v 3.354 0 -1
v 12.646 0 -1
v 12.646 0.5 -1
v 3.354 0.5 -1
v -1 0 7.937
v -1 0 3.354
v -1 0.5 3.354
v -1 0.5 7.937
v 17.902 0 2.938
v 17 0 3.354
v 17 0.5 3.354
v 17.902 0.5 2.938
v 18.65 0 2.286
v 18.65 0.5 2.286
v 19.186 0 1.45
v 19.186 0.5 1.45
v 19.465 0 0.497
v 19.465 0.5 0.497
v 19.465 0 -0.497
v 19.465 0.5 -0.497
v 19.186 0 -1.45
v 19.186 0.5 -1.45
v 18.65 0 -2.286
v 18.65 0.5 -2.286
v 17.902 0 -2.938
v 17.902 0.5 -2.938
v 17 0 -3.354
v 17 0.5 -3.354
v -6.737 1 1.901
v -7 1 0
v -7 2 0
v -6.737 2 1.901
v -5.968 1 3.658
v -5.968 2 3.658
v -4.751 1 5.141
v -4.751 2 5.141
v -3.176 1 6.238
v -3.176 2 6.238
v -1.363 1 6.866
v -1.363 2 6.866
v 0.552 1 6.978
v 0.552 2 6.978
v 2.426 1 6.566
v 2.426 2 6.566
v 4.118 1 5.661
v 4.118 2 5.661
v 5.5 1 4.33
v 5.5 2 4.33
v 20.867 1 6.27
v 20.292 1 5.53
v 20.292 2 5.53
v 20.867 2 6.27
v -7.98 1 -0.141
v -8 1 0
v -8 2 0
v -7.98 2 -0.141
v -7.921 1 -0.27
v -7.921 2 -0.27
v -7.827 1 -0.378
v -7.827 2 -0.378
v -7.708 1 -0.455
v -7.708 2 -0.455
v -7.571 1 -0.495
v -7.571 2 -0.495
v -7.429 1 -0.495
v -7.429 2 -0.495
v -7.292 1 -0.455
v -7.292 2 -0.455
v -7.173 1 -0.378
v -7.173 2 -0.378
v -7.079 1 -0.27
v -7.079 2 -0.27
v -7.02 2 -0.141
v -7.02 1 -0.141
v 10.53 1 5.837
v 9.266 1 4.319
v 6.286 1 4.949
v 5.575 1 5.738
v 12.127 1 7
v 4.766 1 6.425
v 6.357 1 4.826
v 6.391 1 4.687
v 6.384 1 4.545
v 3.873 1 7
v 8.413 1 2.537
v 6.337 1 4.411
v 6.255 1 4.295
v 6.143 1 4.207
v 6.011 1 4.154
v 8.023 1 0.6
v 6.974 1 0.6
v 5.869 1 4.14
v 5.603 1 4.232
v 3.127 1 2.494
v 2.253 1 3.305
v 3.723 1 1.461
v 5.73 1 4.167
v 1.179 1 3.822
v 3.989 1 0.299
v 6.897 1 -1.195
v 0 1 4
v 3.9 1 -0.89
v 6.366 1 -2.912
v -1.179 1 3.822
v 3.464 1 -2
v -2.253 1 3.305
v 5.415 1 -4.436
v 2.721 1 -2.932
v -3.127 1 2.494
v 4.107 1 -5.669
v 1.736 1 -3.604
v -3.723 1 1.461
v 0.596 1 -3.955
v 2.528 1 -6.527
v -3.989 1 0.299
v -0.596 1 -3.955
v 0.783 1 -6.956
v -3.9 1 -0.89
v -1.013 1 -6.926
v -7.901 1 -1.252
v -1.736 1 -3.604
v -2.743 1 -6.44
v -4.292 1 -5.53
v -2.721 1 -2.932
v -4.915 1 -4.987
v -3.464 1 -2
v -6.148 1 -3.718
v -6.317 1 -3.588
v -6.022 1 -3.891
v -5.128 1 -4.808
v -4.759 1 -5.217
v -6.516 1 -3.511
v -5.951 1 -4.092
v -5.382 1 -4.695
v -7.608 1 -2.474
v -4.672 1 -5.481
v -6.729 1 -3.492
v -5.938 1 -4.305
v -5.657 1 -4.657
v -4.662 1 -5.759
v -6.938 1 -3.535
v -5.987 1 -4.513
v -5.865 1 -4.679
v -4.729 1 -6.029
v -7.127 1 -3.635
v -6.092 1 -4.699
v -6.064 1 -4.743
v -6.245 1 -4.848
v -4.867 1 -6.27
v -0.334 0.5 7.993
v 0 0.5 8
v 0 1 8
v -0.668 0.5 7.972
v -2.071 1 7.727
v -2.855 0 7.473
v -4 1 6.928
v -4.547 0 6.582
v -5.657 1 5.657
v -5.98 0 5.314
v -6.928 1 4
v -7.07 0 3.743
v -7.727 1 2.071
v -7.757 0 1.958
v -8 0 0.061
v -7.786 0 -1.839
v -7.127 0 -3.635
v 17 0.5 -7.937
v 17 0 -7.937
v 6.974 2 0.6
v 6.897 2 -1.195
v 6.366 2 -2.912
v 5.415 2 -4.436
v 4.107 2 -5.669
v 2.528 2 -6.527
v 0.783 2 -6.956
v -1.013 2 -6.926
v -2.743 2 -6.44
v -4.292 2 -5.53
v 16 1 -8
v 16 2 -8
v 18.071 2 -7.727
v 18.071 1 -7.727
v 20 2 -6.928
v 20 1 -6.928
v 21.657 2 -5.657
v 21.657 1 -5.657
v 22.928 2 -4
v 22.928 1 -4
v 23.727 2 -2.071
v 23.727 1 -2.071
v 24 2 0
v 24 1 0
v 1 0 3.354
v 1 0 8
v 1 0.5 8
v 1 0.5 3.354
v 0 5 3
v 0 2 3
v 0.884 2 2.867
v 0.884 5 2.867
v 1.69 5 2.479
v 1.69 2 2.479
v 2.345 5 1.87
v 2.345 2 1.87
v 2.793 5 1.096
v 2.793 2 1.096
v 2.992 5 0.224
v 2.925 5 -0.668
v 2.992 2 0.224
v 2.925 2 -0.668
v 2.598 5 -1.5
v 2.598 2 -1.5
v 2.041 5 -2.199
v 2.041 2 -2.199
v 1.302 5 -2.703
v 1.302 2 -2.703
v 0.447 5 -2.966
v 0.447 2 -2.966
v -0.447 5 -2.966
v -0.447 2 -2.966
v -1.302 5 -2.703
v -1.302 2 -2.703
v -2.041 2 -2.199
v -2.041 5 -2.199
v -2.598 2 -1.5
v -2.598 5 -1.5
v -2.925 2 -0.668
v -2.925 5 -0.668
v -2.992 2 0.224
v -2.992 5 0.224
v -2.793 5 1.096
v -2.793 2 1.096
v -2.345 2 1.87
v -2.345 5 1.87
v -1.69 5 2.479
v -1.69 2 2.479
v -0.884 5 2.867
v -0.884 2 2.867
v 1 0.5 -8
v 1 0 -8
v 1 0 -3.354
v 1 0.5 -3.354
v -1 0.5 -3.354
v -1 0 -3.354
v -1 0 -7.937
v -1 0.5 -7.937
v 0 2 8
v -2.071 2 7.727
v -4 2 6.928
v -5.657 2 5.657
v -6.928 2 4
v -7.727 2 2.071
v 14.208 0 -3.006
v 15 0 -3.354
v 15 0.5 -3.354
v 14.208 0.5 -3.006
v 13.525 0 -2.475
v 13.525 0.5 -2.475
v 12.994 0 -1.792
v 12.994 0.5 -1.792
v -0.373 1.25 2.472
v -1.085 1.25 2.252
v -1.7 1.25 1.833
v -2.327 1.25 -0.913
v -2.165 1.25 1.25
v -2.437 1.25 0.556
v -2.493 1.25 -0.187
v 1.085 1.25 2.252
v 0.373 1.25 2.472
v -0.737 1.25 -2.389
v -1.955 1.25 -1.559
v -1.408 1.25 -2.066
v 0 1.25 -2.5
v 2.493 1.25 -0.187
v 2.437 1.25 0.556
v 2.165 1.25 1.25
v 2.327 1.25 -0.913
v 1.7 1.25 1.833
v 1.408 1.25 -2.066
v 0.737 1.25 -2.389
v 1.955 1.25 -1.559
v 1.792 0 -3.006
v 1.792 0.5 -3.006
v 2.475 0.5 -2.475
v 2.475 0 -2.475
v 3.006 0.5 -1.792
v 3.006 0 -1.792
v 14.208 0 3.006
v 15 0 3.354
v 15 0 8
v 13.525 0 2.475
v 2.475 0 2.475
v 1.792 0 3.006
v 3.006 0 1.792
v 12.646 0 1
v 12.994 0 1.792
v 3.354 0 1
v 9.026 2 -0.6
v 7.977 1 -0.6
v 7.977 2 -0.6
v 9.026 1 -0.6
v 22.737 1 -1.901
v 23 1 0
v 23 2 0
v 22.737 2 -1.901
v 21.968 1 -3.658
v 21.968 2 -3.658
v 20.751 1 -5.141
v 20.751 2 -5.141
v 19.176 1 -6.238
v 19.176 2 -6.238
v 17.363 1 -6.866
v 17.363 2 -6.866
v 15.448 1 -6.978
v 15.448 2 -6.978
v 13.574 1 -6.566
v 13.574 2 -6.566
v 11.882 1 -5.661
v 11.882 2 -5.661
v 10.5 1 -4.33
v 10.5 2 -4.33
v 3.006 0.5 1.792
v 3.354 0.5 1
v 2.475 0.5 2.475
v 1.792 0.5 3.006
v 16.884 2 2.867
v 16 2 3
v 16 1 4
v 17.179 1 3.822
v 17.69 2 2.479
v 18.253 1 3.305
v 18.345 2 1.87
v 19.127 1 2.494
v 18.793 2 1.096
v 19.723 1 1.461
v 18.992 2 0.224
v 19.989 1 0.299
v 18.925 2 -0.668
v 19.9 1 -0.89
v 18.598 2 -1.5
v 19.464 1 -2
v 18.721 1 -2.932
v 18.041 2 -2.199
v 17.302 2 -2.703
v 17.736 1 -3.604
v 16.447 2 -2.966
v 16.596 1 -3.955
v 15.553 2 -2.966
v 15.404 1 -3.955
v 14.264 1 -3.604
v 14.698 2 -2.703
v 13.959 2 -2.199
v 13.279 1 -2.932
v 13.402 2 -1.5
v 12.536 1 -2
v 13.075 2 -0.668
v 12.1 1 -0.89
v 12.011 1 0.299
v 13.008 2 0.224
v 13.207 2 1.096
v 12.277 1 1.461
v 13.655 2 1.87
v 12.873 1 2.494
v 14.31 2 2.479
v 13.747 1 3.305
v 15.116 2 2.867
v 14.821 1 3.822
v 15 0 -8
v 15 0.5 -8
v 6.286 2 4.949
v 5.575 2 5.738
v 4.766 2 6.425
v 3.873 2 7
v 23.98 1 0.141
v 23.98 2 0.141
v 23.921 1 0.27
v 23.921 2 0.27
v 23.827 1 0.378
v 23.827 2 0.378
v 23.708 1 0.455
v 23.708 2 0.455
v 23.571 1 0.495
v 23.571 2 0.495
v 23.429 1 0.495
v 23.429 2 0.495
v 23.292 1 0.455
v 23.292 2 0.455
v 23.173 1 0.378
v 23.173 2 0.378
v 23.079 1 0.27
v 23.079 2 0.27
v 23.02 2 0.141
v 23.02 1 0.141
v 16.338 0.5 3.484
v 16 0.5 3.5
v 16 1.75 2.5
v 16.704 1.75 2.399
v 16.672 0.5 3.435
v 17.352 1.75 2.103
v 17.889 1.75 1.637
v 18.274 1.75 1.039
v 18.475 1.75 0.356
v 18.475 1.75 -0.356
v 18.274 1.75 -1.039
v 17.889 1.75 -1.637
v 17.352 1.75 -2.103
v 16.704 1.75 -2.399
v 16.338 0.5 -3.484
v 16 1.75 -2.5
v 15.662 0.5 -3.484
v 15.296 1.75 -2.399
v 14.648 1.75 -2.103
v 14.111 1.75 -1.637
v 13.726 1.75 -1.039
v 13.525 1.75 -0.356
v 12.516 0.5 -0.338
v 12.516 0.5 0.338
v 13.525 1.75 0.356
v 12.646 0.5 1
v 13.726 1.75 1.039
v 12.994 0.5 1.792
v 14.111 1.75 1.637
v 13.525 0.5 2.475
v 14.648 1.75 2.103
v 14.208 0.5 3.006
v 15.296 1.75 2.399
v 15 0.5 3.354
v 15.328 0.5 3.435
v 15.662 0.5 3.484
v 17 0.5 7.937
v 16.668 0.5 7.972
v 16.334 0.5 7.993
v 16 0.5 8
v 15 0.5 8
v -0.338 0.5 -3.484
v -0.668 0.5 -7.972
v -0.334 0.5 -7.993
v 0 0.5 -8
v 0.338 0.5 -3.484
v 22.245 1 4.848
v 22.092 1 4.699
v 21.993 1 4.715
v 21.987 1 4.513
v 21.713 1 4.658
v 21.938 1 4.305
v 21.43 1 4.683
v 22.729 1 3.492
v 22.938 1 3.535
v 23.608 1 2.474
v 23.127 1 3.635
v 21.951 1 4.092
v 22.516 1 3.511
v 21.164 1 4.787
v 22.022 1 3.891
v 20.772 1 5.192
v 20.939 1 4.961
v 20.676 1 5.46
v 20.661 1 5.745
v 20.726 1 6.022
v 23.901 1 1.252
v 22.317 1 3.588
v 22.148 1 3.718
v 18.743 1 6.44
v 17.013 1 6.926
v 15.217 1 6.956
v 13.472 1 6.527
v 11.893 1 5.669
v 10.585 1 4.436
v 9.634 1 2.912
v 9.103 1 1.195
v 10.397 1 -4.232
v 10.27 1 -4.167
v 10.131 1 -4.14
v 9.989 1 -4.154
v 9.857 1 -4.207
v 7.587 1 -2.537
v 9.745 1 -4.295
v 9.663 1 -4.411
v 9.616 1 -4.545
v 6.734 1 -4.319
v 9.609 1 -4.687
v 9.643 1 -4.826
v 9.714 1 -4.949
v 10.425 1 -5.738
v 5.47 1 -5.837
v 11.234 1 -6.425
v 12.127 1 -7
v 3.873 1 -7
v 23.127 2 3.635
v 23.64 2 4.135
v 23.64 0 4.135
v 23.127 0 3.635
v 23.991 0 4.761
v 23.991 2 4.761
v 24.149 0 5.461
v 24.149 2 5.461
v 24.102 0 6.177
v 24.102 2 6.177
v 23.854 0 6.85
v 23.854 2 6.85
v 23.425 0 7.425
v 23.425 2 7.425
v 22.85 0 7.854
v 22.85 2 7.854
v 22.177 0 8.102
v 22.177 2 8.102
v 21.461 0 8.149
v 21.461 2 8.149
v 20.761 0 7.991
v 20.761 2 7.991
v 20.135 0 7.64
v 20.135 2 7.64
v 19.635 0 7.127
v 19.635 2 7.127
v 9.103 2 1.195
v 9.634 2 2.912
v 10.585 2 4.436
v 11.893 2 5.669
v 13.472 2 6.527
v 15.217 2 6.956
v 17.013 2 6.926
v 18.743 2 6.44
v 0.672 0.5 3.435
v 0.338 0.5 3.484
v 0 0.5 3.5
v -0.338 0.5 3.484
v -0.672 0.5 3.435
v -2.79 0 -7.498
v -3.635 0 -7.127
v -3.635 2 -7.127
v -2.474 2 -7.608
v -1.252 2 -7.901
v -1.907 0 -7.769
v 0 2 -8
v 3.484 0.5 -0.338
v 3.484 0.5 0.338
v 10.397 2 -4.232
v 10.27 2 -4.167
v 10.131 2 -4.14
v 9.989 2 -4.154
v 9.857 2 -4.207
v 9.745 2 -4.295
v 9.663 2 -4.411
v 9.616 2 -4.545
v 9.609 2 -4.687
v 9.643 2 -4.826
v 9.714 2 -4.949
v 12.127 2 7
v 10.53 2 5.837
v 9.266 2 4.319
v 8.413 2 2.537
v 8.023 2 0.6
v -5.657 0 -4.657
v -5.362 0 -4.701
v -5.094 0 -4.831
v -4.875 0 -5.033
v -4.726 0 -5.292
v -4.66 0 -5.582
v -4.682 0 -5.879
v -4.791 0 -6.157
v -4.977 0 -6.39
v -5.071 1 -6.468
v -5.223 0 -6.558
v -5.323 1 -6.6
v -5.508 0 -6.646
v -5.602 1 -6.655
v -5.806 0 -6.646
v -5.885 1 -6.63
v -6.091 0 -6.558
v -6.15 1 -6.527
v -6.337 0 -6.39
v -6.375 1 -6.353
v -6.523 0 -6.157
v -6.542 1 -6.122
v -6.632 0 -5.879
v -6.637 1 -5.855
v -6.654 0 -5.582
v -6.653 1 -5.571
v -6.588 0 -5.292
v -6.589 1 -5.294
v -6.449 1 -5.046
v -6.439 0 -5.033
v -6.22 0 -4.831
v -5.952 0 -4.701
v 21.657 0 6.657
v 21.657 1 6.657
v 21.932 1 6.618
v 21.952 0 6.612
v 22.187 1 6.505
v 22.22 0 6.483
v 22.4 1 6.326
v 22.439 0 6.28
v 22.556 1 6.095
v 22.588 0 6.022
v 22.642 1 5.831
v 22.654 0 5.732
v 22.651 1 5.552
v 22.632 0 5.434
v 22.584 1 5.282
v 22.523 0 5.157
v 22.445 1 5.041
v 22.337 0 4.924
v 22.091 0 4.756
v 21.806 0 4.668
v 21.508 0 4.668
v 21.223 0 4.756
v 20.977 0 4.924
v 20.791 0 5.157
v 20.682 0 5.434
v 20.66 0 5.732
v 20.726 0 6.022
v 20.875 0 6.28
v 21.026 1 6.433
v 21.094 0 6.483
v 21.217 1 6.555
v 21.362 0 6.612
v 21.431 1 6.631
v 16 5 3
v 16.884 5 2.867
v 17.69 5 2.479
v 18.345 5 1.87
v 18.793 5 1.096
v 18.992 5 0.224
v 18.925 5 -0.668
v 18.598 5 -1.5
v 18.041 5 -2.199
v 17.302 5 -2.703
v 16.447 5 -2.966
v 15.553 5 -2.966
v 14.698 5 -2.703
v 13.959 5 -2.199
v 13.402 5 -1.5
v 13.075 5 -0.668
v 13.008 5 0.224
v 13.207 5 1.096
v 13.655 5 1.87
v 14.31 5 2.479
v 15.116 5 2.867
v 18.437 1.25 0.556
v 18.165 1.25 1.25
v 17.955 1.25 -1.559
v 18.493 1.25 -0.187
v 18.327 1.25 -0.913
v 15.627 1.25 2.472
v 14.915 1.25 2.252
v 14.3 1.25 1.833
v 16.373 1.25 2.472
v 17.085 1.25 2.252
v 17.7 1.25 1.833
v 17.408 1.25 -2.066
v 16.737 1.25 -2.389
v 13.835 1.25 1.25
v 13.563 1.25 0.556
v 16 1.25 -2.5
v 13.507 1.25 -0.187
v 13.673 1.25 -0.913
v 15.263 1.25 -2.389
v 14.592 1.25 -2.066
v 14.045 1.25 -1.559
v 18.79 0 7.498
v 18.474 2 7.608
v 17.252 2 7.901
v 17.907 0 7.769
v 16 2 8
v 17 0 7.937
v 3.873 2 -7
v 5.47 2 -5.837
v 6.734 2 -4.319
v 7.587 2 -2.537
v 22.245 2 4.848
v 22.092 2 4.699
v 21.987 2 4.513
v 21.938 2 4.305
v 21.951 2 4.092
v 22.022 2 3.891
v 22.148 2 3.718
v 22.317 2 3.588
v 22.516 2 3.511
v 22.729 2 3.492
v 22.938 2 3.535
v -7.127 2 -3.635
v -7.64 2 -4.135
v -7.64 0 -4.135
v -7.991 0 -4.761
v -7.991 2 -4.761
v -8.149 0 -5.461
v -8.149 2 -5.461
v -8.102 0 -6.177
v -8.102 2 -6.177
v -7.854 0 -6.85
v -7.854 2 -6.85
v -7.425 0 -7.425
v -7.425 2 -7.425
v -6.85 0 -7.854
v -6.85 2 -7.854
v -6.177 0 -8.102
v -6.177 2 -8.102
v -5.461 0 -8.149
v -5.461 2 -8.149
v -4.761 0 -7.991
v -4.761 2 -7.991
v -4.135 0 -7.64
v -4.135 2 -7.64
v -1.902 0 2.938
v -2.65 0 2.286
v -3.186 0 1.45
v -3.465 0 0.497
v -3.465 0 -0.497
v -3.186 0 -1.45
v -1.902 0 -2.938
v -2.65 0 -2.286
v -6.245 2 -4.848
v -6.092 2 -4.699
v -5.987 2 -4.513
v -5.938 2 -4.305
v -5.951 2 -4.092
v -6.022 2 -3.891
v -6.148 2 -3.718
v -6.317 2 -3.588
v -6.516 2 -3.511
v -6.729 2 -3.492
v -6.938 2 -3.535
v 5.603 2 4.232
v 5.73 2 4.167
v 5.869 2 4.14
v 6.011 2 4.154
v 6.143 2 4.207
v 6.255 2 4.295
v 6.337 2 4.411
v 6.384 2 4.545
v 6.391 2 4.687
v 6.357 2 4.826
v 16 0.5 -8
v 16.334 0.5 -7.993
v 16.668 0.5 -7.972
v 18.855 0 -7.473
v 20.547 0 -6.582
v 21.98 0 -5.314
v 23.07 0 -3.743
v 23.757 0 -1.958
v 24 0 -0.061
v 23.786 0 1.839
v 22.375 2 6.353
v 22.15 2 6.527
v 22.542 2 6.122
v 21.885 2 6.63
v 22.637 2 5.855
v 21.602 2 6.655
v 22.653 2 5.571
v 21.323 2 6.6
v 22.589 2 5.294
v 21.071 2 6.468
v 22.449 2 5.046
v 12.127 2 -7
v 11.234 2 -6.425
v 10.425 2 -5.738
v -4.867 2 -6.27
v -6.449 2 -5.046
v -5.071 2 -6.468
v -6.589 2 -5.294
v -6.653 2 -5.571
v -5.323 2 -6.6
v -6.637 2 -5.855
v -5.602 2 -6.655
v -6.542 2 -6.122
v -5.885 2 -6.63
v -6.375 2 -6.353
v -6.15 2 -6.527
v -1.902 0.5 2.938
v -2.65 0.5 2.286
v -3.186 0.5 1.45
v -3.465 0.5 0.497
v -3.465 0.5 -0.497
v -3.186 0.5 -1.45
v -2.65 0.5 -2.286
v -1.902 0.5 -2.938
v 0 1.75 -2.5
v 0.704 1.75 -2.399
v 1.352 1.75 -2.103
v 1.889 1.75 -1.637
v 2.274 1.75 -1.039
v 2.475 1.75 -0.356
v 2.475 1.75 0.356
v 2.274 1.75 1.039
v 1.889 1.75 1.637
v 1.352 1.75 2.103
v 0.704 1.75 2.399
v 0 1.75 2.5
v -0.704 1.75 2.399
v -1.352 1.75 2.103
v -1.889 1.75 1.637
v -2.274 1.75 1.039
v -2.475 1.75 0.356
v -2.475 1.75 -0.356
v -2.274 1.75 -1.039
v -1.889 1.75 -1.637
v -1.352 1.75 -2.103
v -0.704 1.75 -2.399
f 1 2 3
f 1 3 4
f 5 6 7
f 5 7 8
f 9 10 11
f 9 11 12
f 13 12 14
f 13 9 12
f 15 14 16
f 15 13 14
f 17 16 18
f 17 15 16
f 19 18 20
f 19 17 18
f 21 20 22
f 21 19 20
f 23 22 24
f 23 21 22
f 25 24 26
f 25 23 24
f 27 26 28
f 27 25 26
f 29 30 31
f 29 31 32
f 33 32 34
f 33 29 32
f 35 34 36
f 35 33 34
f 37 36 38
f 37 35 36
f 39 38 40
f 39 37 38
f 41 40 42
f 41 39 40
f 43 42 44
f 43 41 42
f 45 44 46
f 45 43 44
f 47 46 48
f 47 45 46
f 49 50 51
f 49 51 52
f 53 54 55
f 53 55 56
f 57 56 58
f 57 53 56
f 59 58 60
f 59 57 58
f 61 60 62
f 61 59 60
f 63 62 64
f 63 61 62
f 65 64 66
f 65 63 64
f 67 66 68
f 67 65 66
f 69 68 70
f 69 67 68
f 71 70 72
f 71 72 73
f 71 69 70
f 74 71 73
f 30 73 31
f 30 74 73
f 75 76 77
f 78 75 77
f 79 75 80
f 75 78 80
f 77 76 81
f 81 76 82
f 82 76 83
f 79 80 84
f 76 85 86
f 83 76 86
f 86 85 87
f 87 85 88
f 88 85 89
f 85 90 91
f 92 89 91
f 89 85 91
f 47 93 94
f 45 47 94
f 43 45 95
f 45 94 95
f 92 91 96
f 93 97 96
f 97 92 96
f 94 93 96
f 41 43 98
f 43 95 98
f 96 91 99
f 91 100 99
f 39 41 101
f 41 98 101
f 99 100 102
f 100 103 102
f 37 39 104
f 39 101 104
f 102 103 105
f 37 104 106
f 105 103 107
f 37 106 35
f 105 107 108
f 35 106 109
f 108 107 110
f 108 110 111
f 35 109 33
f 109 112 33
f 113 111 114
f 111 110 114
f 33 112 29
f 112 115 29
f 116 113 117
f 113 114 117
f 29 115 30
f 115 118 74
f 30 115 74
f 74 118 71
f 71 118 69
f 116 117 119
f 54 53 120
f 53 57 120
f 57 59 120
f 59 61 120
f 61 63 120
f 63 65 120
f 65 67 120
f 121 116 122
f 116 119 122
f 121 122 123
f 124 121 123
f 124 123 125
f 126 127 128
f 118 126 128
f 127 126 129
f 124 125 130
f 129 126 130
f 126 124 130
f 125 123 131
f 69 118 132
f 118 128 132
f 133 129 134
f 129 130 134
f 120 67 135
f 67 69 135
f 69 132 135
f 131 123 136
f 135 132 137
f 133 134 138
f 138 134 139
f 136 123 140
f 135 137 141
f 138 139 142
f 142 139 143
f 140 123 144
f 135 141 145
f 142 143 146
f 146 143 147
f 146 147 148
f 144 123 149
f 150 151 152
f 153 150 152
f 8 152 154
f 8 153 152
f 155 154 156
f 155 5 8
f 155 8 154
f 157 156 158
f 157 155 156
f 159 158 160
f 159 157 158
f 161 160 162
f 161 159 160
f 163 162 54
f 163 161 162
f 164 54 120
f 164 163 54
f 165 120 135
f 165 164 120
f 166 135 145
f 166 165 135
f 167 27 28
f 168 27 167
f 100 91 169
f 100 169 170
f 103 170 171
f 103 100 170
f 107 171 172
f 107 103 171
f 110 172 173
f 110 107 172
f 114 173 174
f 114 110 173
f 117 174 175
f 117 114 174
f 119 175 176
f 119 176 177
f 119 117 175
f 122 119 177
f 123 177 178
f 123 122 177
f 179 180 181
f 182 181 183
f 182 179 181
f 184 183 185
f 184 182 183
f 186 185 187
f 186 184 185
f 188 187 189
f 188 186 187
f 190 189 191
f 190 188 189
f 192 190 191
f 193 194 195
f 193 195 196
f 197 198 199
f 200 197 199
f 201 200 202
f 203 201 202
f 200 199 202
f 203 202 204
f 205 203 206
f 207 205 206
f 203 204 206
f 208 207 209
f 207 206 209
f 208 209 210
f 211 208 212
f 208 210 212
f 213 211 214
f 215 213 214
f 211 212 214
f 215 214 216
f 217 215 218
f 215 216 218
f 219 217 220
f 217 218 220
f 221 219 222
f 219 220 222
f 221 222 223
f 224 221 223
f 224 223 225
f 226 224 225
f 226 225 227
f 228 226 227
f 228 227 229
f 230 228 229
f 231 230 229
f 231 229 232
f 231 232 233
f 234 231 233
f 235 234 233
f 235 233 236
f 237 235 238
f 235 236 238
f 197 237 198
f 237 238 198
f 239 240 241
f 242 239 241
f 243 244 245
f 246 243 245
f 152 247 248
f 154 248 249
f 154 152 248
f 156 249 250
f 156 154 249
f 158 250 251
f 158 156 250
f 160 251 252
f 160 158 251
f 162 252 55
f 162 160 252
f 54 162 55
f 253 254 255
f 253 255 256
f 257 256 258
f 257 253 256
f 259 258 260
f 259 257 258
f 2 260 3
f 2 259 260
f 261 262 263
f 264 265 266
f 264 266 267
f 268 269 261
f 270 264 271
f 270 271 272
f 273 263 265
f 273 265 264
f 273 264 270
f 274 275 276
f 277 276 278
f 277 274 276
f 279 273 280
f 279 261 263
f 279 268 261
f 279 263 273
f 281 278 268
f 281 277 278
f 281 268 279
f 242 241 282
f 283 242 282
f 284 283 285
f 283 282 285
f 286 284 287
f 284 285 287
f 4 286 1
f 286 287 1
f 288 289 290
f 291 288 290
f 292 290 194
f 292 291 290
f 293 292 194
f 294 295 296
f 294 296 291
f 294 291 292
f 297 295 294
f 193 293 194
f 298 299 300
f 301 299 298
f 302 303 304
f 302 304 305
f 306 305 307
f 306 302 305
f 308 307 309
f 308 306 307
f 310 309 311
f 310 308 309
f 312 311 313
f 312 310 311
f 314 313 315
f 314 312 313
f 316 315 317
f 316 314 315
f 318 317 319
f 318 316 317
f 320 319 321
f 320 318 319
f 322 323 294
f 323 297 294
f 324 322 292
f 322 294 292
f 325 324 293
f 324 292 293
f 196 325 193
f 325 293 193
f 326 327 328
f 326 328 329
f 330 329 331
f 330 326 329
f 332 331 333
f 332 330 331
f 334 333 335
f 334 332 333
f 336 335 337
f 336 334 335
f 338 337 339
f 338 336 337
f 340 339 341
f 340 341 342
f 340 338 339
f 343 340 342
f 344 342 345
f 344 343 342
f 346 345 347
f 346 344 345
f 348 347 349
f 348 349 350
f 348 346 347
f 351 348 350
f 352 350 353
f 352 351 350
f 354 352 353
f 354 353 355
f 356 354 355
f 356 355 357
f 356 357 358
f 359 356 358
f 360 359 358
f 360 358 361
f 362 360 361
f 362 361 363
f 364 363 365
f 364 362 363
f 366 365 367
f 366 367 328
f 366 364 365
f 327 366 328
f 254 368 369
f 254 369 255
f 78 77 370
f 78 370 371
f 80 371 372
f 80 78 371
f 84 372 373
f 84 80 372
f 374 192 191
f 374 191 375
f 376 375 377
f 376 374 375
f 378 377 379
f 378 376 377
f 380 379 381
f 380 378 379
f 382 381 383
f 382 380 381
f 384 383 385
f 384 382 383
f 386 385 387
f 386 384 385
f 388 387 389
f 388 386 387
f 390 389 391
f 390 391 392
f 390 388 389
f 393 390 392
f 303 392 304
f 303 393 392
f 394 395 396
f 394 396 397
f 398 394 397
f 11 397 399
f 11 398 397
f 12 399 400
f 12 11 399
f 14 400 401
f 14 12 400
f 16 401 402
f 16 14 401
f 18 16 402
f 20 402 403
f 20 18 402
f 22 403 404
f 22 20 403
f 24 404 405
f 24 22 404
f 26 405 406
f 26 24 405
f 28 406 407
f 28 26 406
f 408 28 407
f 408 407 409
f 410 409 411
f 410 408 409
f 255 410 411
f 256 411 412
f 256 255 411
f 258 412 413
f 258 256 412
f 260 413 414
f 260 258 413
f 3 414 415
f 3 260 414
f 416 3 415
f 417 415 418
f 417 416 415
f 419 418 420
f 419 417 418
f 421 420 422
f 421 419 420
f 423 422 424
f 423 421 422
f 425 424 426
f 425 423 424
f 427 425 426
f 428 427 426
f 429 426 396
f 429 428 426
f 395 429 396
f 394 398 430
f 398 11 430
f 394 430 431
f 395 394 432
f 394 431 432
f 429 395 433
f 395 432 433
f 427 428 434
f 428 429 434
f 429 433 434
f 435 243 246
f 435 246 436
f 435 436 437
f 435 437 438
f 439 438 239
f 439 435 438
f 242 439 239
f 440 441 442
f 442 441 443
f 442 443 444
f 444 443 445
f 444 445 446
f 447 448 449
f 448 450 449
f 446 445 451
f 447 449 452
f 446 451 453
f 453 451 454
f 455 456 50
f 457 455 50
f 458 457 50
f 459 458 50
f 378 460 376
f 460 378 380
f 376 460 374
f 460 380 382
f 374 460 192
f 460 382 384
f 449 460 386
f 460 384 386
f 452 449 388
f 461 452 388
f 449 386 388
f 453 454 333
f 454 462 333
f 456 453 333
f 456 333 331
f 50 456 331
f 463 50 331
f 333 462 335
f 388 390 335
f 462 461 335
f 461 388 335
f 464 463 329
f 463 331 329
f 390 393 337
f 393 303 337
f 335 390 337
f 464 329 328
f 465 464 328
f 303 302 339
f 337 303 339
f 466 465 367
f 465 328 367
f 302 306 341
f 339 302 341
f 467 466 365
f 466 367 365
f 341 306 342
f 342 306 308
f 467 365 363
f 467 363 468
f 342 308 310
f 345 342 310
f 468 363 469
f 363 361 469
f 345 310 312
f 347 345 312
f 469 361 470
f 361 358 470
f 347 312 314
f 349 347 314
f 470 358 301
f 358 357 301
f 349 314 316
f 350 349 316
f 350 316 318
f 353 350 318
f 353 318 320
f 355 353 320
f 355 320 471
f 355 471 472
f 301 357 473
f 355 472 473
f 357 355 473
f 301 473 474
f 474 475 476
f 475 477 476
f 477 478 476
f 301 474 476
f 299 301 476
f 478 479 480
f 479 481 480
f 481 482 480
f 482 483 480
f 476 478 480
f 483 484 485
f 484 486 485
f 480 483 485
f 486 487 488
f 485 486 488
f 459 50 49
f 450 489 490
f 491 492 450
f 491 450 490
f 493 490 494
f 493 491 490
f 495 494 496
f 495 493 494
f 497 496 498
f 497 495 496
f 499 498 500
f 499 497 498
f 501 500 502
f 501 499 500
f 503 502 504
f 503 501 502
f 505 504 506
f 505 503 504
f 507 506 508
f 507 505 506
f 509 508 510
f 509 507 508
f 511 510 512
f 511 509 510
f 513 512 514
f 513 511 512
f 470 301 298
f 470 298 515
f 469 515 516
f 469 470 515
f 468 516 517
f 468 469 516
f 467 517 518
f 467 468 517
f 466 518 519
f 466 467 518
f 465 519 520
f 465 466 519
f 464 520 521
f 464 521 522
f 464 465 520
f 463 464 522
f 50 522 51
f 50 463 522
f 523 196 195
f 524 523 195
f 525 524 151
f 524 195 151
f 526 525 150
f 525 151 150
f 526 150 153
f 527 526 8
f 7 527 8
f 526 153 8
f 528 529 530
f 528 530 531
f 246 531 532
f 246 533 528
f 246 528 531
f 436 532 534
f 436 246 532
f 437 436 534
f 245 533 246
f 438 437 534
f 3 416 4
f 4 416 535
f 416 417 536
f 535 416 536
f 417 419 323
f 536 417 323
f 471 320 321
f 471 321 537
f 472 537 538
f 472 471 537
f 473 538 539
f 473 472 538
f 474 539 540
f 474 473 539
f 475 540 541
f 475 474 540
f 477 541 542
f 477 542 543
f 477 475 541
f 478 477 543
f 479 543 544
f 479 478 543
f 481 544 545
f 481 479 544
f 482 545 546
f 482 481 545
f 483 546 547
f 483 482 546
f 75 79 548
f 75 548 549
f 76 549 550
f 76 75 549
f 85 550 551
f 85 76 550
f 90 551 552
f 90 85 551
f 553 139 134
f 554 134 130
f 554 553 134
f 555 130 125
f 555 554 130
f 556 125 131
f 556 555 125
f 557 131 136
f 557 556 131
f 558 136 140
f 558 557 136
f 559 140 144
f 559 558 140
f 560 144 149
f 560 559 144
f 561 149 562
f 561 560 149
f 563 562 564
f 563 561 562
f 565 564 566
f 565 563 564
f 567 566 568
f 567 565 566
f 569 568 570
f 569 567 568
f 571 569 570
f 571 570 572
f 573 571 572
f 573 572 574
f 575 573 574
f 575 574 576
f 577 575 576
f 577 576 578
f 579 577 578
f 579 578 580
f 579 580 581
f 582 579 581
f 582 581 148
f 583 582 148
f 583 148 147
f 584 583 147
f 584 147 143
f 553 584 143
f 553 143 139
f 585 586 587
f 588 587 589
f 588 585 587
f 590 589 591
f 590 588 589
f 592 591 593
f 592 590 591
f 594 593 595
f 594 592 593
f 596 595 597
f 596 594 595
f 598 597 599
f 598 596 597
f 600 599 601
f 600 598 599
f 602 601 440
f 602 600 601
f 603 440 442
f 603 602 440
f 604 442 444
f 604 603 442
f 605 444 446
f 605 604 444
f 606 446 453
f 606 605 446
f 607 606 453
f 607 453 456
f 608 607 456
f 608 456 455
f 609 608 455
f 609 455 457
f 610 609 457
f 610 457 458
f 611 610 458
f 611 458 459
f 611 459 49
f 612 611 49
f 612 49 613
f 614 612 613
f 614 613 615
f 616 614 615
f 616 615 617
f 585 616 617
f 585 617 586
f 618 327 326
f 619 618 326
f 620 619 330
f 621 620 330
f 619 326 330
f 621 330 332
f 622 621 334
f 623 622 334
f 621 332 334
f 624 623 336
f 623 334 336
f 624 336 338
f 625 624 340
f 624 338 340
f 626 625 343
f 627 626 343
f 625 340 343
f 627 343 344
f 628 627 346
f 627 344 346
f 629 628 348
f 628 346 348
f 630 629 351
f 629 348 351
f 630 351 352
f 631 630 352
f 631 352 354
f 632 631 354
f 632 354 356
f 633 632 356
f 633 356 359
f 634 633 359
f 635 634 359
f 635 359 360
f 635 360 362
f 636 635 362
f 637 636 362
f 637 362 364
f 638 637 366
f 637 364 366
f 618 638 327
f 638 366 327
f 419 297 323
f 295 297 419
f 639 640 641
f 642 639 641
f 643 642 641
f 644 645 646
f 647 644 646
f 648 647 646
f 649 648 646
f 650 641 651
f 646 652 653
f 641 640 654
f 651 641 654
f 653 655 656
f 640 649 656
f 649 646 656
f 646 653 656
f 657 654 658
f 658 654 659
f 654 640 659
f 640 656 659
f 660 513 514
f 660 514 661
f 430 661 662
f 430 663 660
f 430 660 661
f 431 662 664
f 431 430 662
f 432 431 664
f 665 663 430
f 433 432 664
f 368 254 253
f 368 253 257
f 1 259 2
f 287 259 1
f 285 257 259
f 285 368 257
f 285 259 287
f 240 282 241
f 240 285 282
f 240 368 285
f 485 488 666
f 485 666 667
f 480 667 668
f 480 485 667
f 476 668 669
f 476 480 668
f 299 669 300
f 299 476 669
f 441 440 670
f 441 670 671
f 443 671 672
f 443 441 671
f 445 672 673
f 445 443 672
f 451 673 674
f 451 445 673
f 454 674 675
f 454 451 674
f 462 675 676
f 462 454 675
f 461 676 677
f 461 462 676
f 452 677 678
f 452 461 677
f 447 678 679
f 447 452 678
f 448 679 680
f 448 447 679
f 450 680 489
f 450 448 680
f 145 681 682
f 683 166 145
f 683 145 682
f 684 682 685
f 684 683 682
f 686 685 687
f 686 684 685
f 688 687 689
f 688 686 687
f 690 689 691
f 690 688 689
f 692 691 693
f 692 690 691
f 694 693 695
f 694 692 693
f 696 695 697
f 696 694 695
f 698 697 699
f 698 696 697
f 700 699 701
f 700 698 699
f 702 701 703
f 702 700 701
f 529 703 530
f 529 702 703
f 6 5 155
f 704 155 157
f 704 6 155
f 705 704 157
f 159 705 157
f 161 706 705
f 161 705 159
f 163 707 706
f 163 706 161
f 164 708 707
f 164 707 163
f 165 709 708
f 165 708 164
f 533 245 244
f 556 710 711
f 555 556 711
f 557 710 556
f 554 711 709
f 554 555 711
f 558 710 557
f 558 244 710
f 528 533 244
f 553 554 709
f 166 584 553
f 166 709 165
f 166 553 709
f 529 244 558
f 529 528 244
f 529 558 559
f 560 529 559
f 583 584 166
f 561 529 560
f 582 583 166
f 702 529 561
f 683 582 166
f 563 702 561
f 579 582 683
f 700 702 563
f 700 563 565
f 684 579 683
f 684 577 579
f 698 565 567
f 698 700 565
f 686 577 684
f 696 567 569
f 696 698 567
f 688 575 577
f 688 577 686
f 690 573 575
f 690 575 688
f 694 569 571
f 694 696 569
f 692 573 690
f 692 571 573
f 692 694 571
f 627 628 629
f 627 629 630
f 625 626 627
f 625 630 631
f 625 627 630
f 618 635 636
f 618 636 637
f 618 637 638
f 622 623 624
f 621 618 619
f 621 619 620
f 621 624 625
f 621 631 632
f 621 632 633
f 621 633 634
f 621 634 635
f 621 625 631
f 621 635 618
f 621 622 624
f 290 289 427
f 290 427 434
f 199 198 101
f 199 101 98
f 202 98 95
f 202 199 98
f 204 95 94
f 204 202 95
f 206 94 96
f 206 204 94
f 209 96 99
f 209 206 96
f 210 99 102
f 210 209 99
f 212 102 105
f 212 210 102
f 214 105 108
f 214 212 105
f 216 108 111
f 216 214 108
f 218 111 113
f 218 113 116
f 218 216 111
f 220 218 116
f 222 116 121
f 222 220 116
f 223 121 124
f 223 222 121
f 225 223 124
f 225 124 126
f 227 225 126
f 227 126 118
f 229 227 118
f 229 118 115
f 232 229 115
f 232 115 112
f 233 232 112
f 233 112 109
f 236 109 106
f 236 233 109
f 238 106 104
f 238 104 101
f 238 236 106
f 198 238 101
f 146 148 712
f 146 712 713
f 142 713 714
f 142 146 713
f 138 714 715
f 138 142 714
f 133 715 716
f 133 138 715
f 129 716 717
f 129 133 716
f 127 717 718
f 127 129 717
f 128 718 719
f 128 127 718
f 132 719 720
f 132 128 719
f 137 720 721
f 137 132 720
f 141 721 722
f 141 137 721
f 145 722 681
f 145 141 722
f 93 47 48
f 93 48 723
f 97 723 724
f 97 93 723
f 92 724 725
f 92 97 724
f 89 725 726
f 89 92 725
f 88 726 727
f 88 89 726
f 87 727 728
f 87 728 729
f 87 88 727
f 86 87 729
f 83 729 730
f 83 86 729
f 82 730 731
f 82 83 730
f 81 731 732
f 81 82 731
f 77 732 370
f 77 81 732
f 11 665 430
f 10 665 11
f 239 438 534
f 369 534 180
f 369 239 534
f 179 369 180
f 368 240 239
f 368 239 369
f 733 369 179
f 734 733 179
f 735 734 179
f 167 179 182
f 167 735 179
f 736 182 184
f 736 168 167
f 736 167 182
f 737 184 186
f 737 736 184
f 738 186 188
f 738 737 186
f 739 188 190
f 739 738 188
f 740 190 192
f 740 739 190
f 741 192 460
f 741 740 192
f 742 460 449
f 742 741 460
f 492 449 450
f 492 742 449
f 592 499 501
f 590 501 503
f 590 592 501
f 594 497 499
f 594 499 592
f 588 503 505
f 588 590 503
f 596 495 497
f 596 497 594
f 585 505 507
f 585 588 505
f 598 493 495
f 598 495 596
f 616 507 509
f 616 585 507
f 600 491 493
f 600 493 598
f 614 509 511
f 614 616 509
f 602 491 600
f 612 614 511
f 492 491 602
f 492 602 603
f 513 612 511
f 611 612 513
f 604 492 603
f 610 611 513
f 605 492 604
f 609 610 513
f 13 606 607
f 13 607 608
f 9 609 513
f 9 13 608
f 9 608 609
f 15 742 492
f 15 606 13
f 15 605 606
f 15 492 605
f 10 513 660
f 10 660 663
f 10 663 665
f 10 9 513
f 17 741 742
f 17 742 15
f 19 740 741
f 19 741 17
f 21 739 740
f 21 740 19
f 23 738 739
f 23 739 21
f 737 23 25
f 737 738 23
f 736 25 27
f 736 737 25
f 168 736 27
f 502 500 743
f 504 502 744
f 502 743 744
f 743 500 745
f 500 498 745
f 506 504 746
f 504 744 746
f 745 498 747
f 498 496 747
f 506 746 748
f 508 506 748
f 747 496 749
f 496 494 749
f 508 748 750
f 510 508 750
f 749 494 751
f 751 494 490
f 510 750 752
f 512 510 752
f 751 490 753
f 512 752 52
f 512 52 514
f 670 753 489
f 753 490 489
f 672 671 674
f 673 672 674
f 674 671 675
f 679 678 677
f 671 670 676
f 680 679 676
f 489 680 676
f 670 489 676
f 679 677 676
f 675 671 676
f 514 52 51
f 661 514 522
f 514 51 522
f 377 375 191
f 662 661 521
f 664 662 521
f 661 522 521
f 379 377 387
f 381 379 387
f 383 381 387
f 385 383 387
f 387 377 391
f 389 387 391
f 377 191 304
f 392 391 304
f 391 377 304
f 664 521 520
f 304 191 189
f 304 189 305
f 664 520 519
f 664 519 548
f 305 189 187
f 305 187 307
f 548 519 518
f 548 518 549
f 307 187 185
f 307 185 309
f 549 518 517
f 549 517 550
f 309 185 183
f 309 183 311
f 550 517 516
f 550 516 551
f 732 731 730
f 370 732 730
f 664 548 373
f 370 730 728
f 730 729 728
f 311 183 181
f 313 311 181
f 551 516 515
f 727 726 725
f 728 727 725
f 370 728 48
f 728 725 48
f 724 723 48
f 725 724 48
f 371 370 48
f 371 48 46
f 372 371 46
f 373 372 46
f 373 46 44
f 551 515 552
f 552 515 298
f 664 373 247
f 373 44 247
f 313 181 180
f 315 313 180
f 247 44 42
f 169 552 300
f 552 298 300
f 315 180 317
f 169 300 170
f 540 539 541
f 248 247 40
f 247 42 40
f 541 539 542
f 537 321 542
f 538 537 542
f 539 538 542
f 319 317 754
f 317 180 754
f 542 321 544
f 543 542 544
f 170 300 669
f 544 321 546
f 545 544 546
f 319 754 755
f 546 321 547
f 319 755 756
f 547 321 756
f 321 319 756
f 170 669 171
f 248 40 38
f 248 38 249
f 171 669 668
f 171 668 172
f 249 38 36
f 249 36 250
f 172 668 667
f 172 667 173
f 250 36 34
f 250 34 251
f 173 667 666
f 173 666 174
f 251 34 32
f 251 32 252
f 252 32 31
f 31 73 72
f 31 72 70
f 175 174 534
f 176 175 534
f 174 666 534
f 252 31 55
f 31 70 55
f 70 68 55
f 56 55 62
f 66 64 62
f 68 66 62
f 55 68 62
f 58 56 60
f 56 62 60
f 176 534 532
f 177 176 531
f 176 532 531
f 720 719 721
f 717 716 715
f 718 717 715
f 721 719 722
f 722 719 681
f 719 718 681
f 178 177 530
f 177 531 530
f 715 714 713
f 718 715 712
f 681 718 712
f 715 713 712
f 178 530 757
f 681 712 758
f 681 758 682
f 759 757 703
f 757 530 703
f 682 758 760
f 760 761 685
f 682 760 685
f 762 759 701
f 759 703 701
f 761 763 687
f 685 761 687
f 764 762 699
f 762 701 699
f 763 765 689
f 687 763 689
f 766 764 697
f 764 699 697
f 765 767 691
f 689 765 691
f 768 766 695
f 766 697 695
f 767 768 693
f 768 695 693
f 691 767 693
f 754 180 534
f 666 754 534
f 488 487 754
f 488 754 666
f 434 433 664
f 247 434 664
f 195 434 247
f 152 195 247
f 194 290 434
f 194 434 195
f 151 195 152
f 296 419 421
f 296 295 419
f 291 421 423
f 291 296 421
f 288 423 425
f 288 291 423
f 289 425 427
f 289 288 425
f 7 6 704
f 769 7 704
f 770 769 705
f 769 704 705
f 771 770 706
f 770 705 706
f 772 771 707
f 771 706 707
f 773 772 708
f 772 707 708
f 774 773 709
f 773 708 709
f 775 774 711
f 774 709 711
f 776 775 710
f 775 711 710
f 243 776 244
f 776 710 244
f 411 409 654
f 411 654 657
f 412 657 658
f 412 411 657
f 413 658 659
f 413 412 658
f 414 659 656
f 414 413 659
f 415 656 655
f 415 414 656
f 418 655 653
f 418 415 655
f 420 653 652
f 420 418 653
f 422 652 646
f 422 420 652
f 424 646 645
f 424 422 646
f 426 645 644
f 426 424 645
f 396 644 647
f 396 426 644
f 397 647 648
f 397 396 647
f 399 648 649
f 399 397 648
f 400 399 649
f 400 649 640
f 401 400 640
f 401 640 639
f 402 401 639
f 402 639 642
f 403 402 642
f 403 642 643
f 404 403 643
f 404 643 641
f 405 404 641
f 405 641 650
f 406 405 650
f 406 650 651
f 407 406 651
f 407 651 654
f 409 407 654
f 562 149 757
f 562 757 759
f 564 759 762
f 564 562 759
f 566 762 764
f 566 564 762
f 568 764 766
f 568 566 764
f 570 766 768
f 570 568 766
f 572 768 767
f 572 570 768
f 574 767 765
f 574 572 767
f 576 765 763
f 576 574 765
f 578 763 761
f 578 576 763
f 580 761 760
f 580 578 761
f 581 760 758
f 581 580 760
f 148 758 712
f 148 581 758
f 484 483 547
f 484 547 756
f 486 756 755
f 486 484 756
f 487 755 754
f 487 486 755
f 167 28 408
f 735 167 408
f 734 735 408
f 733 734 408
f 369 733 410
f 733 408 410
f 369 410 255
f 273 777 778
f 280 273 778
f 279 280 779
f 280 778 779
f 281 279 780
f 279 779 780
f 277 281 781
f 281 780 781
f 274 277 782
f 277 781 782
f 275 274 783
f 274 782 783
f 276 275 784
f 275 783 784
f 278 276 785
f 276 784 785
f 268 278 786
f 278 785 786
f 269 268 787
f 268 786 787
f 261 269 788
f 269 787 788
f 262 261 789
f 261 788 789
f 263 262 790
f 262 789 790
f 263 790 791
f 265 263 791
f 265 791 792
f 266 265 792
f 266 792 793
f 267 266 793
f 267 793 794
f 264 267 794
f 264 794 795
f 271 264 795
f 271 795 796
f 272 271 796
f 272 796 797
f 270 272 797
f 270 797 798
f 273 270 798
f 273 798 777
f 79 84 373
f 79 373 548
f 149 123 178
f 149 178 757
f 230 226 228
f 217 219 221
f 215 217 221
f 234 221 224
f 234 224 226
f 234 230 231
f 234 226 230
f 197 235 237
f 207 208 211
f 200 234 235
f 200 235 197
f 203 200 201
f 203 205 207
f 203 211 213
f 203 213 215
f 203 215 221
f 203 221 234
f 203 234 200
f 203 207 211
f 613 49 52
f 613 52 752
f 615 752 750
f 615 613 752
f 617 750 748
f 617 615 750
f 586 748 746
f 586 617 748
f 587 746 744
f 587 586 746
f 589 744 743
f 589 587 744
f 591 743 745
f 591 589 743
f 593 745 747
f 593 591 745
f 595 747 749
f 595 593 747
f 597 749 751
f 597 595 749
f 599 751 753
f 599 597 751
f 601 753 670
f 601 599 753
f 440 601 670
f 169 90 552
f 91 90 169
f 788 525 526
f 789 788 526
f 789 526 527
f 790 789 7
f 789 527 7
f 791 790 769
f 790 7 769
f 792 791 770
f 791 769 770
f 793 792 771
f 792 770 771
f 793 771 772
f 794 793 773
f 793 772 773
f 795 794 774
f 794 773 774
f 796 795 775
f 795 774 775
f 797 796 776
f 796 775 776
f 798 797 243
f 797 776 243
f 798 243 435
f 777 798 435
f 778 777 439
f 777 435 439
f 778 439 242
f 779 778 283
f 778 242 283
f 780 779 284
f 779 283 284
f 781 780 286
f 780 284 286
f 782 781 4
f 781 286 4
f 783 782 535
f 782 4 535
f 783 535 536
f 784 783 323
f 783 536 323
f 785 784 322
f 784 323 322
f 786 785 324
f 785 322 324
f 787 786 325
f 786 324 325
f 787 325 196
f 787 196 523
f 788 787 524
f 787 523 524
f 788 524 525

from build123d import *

# Parameters (mm, degrees)
SKETCH1_R            = 1
BASE_EXTRUDE_DEPTH   = 1
BOSS_EXTRUDE7_DEPTH  = 1
CIRPATTERN1_COUNT    = 2
BOSS_EXTRUDE8_DEPTH  = 1
SKETCH10_R           = 3
BOSS_EXTRUDE9_DEPTH  = 4
CHAMFER1_SIZE        = 1
CUT_EXTRUDE1_DEPTH   = 0.5
SKETCH14_R           = 2.5
BOSS_EXTRUDE10_DEPTH = 0.5


with BuildPart() as part:
    # Sketch1 → Base Extrude (new body)
    with BuildSketch(Plane(origin=(0, 0, 0), x_dir=(1, 0, 0), z_dir=(0, 1, 0))):
        with BuildLine():
            Line((0, 8), (16, 8))
            ThreePointArc((16, 8), (22.821901857, 4.178714521), (23.126695088, -3.634586238))
            ThreePointArc((23.126695088, -3.634586238), (23.424621202, -7.424621202), (19.634586238, -7.126695088))
            ThreePointArc((19.634586238, -7.126695088), (17.86901569, -7.778610438), (16, -8))
            Line((16, -8), (0, -8))
            ThreePointArc((0, -8), (-6.821901857, -4.178714521), (-7.126695088, 3.634586238))
            ThreePointArc((-7.126695088, 3.634586238), (-7.424621202, 7.424621202), (-3.634586238, 7.126695088))
            ThreePointArc((-3.634586238, 7.126695088), (-1.86901569, 7.778610438), (0, 8))
        make_face()
        with Locations(Location((-5.656854249, 5.656854249, 0), (0, 0, 270))):
            Circle(SKETCH1_R, mode=Mode.SUBTRACT)
        with Locations(Location((21.656854249, -5.656854249, 0), (0, 0, 270))):
            Circle(SKETCH1_R, mode=Mode.SUBTRACT)
    extrude(amount=BASE_EXTRUDE_DEPTH)

    # Sketch4 → Boss-Extrude7 (add)
    with BuildSketch(Plane(origin=(0, 1, 0), x_dir=(1, 0, 0), z_dir=(0, 1, 0))):
        with BuildLine():
            Line((-4.292206887, 5.529643754), (-4.866905142, 6.270026662))
            ThreePointArc((-4.866905142, 6.270026662), (-6.37503243, 6.352713503), (-6.244790585, 4.847947045))
            ThreePointArc((-6.244790585, 4.847947045), (-6.079062433, 3.80031439), (-7.126695088, 3.634586238))
            ThreePointArc((-7.126695088, 3.634586238), (-7.424621202, 7.424621202), (-3.634586238, 7.126695088))
            ThreePointArc((-3.634586238, 7.126695088), (-1.86901569, 7.778610438), (0, 8))
            ThreePointArc((0, 8), (5.656854249, 5.656854249), (8, 0))
            ThreePointArc((8, 0), (8.005634917, -0.300211458), (8.02253173, -0.6))
            Line((8.02253173, -0.6), (6.97423831, -0.6))
            ThreePointArc((6.97423831, -0.6), (3.3453634, 6.148865239), (-4.292206887, 5.529643754))
        make_face()
        with BuildLine():
            ThreePointArc((-7, 0), (-2.291287847, -6.614378278), (5.5, -4.330127019))
            ThreePointArc((5.5, -4.330127019), (6.20215193, -4.246564663), (6.285714286, -4.948716593))
            ThreePointArc((6.285714286, -4.948716593), (3.493584639, -7.196865038), (0, -8))
            ThreePointArc((0, -8), (-5.656854249, -5.656854249), (-8, 0))
            ThreePointArc((-8, 0), (-7.5, 0.5), (-7, 0))
        make_face()
    boss_extrude7 = extrude(amount=BOSS_EXTRUDE7_DEPTH)

    # CirPattern1: Boss-Extrude7 ×2 about axis
    cirpattern1_axis = Axis((8, 0, 0), (0, 1, 0))
    for i in range(1, CIRPATTERN1_COUNT):
        add(boss_extrude7.rotate(cirpattern1_axis, i * 360 / CIRPATTERN1_COUNT))

    # Sketch9 → Boss-Extrude8 (add)
    with BuildSketch(Plane(origin=(0, 1, 0), x_dir=(1, 0, 0), z_dir=(0, 1, 0))):
        with BuildLine():
            Line((12.127016654, 7), (3.872983346, 7))
            ThreePointArc((3.872983346, 7), (2, 7.745966692), (0, 8))
            Line((0, 8), (16, 8))
            ThreePointArc((16, 8), (14, 7.745966692), (12.127016654, 7))
        make_face()
        with BuildLine():
            Line((3.872983346, -7), (12.127016654, -7))
            ThreePointArc((12.127016654, -7), (14, -7.745966692), (16, -8))
            Line((16, -8), (0, -8))
            ThreePointArc((0, -8), (2, -7.745966692), (3.872983346, -7))
        make_face()
    extrude(amount=BOSS_EXTRUDE8_DEPTH)

    # Sketch10 → Boss-Extrude9 (add)
    with BuildSketch(Plane(origin=(0, 1, 0), x_dir=(1, 0, 0), z_dir=(0, 1, 0))):
        with Locations(Location((16, 0, 0), (0, 0, 270))):
            Circle(SKETCH10_R)
        with Locations(Location((0, 0, 0), (0, 0, 270))):
            Circle(SKETCH10_R)
    extrude(amount=BOSS_EXTRUDE9_DEPTH)

    # Chamfer1
    chamfer1_edges = [part.edges().sort_by_distance(p)[0] for p in [
        (16, 1, -3),
        (0, 1, -3),
    ]]
    chamfer(chamfer1_edges, length=CHAMFER1_SIZE)

    # Sketch12 → Back Cavity (revolve, cut)
    with BuildSketch(Plane.XY, mode=Mode.PRIVATE) as back_cavity_sk:
        Polygon((0, 1.75), (2.5, 1.75), (3.5, 0.5), (3.5, 0), (0, 0), align=None)
    back_cavity = revolve(back_cavity_sk.sketch.rotate(Axis((0, 3.203039839, 0), (0, -1, 0)), 90), axis=Axis((0, 3.203039839, 0), (0, -1, 0)), mode=Mode.SUBTRACT)

    # Mirror1: Back Cavity across plane
    add(back_cavity.mirror(Plane(origin=(8, 0, 0), x_dir=(0, 0, 1), z_dir=(1, 0, 0))), mode=Mode.SUBTRACT)

    # Sketch13 → Cut-Extrude1 (cut)
    with BuildSketch(Plane.XZ):
        with BuildLine():
            Line((3.354101966, 1), (12.645898034, 1))
            ThreePointArc((12.645898034, 1), (12.5, 0), (12.645898034, -1))
            Line((12.645898034, -1), (3.354101966, -1))
            ThreePointArc((3.354101966, -1), (3.5, 0), (3.354101966, 1))
        make_face()
        with BuildLine():
            Line((-1, 3.354101966), (-1, 7.937253933))
            ThreePointArc((-1, 7.937253933), (-0.5009833, 7.984298074), (0, 8))
            Line((0, 8), (1, 8))
            Line((1, 8), (1, 3.354101966))
            ThreePointArc((1, 3.354101966), (0, 3.5), (-1, 3.354101966))
        make_face()
        with BuildLine():
            Line((16, -8), (15, -8))
            Line((15, -8), (15, -3.354101966))
            ThreePointArc((15, -3.354101966), (16, -3.5), (17, -3.354101966))
            Line((17, -3.354101966), (17, -7.937253933))
            ThreePointArc((17, -7.937253933), (16.5009833, -7.984298074), (16, -8))
        make_face()
        with BuildLine():
            Line((-1, -3.354101966), (-1, -7.937253933))
            ThreePointArc((-1, -7.937253933), (-0.5009833, -7.984298074), (0, -8))
            Line((0, -8), (1, -8))
            Line((1, -8), (1, -3.354101966))
            ThreePointArc((1, -3.354101966), (0, -3.5), (-1, -3.354101966))
        make_face()
        with BuildLine():
            Line((15, 3.354101966), (15, 8))
            Line((15, 8), (16, 8))
            ThreePointArc((16, 8), (16.5009833, 7.984298074), (17, 7.937253933))
            Line((17, 7.937253933), (17, 3.354101966))
            ThreePointArc((17, 3.354101966), (16, 3.5), (15, 3.354101966))
        make_face()
    extrude(amount=-CUT_EXTRUDE1_DEPTH, mode=Mode.SUBTRACT)

    # Sketch14 → Boss-Extrude10 (add)
    with BuildSketch(Plane.XZ.offset(-1.75)):
        with Locations(Location((0, 0, 0), (0, 0, 270))):
            Circle(SKETCH14_R)
    boss_extrude10 = extrude(amount=BOSS_EXTRUDE10_DEPTH)

    # Mirror2: Boss-Extrude10 across plane
    add(boss_extrude10.mirror(Plane(origin=(8, 0, 0), x_dir=(0, 0, 1), z_dir=(1, 0, 0))))


solid = part.part
